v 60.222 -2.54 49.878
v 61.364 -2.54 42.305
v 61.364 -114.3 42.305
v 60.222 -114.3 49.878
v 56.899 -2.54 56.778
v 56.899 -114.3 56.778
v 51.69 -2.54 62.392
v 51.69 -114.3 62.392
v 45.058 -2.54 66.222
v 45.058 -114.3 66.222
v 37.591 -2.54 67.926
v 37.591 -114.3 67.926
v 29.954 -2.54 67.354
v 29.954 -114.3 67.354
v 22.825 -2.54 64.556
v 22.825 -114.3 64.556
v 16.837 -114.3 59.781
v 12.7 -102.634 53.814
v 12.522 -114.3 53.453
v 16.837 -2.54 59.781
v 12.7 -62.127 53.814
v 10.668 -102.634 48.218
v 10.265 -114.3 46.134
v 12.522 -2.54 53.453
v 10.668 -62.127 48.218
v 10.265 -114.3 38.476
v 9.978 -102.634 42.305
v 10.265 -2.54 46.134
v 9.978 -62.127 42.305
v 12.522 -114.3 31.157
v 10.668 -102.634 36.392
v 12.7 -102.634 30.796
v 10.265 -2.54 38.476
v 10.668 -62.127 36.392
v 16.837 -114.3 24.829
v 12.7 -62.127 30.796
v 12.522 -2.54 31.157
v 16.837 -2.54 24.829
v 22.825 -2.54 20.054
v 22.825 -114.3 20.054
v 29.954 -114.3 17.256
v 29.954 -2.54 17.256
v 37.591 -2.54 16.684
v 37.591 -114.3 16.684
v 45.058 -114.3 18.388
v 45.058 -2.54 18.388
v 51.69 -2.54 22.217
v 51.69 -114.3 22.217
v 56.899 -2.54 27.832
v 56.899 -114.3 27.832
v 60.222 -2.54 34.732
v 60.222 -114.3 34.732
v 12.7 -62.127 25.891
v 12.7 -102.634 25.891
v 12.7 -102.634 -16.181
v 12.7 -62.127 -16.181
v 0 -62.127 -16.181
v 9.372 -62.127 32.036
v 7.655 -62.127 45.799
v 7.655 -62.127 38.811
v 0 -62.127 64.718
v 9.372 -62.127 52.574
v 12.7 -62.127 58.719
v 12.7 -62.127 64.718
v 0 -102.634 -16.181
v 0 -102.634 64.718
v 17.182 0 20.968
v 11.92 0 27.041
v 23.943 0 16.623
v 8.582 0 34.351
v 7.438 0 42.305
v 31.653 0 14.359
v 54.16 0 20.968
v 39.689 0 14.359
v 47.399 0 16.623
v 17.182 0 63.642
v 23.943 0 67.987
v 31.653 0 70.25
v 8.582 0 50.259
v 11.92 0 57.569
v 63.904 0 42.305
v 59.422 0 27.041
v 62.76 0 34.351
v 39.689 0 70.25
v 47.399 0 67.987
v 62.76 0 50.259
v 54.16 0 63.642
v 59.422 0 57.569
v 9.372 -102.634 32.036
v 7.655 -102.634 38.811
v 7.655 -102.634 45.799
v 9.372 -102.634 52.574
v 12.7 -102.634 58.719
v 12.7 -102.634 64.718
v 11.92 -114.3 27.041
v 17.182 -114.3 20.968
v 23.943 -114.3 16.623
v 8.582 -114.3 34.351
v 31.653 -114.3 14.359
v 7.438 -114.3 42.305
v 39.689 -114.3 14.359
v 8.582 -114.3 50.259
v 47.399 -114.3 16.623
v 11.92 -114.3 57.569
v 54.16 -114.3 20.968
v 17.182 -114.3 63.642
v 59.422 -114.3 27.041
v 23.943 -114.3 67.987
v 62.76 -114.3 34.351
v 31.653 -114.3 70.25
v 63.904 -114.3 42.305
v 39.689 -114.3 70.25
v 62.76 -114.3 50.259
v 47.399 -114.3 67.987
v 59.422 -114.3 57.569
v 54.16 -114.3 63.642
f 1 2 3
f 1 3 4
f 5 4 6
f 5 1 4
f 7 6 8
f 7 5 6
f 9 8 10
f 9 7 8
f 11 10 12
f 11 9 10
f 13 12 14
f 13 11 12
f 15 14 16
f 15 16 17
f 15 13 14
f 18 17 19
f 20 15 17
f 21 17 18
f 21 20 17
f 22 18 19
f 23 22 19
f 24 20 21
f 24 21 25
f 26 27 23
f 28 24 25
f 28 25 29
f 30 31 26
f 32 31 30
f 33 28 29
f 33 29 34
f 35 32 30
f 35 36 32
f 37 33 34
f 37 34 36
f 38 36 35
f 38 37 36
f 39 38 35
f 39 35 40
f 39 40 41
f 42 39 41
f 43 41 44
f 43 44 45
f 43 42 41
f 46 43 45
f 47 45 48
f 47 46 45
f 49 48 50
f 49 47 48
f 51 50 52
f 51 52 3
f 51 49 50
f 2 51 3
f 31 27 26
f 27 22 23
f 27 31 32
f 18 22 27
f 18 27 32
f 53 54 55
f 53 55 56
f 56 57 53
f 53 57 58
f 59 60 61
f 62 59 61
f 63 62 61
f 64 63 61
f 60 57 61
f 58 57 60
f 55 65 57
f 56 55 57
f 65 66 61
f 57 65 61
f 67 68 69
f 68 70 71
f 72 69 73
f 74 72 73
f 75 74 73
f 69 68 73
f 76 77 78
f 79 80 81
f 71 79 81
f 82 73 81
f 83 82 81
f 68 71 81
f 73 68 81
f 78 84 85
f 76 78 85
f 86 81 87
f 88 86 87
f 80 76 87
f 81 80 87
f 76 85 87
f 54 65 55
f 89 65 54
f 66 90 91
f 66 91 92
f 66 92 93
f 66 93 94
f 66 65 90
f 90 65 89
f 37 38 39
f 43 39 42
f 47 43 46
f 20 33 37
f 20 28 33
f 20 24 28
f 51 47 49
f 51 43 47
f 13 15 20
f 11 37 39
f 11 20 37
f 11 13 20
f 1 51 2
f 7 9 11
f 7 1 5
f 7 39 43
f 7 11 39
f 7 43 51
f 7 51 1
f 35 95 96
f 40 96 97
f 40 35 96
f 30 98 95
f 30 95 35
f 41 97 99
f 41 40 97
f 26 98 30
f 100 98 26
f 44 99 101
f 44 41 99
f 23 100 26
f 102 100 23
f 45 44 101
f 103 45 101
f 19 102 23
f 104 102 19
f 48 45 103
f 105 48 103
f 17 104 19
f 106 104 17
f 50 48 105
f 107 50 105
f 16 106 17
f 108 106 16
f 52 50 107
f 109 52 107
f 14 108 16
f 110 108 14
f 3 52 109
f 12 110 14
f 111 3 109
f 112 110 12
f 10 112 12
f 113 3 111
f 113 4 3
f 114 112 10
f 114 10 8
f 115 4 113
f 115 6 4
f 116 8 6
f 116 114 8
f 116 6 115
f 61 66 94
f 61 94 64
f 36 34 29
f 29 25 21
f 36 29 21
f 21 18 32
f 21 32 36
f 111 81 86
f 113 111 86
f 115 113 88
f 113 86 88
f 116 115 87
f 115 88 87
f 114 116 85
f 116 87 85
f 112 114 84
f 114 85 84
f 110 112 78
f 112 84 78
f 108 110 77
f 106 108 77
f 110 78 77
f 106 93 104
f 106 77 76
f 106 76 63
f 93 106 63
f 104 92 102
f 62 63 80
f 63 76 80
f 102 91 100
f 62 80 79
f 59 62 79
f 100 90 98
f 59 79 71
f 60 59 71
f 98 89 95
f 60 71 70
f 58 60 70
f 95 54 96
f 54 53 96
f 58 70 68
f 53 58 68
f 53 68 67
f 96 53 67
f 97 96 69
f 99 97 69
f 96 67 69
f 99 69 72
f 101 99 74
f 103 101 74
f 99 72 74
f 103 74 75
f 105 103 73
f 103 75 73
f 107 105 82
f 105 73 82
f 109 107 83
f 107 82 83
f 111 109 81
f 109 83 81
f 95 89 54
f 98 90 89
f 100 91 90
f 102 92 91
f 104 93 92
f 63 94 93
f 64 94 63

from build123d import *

# Parameters (mm, degrees)
F0_R     = 28.232887
F1_DEPTH = 114.3
F2_T     = -2.54
F3_W     = 40.50754
F3_H     = 80.898837
F4_DEPTH = 12.7


with BuildPart() as f1:
    # F0 (on Front) → F1 (new body)
    with BuildSketch(Plane.XZ):
        with Locations((35.670944, 42.30497)):
            Circle(F0_R)
    extrude(amount=F1_DEPTH)

    # F2
    f2_openings = [f1.faces().sort_by_distance(p)[0] for p in [
        (35.670944, -114.3, 42.30497),
    ]]
    offset(amount=F2_T, openings=f2_openings)

    # F3 (on Right) → F4 (join)
    with BuildSketch(Plane.YZ):
        with Locations((-82.380377, 24.268664)):
            Rectangle(F3_W, F3_H)
    extrude(amount=F4_DEPTH)


solid = f1.part
